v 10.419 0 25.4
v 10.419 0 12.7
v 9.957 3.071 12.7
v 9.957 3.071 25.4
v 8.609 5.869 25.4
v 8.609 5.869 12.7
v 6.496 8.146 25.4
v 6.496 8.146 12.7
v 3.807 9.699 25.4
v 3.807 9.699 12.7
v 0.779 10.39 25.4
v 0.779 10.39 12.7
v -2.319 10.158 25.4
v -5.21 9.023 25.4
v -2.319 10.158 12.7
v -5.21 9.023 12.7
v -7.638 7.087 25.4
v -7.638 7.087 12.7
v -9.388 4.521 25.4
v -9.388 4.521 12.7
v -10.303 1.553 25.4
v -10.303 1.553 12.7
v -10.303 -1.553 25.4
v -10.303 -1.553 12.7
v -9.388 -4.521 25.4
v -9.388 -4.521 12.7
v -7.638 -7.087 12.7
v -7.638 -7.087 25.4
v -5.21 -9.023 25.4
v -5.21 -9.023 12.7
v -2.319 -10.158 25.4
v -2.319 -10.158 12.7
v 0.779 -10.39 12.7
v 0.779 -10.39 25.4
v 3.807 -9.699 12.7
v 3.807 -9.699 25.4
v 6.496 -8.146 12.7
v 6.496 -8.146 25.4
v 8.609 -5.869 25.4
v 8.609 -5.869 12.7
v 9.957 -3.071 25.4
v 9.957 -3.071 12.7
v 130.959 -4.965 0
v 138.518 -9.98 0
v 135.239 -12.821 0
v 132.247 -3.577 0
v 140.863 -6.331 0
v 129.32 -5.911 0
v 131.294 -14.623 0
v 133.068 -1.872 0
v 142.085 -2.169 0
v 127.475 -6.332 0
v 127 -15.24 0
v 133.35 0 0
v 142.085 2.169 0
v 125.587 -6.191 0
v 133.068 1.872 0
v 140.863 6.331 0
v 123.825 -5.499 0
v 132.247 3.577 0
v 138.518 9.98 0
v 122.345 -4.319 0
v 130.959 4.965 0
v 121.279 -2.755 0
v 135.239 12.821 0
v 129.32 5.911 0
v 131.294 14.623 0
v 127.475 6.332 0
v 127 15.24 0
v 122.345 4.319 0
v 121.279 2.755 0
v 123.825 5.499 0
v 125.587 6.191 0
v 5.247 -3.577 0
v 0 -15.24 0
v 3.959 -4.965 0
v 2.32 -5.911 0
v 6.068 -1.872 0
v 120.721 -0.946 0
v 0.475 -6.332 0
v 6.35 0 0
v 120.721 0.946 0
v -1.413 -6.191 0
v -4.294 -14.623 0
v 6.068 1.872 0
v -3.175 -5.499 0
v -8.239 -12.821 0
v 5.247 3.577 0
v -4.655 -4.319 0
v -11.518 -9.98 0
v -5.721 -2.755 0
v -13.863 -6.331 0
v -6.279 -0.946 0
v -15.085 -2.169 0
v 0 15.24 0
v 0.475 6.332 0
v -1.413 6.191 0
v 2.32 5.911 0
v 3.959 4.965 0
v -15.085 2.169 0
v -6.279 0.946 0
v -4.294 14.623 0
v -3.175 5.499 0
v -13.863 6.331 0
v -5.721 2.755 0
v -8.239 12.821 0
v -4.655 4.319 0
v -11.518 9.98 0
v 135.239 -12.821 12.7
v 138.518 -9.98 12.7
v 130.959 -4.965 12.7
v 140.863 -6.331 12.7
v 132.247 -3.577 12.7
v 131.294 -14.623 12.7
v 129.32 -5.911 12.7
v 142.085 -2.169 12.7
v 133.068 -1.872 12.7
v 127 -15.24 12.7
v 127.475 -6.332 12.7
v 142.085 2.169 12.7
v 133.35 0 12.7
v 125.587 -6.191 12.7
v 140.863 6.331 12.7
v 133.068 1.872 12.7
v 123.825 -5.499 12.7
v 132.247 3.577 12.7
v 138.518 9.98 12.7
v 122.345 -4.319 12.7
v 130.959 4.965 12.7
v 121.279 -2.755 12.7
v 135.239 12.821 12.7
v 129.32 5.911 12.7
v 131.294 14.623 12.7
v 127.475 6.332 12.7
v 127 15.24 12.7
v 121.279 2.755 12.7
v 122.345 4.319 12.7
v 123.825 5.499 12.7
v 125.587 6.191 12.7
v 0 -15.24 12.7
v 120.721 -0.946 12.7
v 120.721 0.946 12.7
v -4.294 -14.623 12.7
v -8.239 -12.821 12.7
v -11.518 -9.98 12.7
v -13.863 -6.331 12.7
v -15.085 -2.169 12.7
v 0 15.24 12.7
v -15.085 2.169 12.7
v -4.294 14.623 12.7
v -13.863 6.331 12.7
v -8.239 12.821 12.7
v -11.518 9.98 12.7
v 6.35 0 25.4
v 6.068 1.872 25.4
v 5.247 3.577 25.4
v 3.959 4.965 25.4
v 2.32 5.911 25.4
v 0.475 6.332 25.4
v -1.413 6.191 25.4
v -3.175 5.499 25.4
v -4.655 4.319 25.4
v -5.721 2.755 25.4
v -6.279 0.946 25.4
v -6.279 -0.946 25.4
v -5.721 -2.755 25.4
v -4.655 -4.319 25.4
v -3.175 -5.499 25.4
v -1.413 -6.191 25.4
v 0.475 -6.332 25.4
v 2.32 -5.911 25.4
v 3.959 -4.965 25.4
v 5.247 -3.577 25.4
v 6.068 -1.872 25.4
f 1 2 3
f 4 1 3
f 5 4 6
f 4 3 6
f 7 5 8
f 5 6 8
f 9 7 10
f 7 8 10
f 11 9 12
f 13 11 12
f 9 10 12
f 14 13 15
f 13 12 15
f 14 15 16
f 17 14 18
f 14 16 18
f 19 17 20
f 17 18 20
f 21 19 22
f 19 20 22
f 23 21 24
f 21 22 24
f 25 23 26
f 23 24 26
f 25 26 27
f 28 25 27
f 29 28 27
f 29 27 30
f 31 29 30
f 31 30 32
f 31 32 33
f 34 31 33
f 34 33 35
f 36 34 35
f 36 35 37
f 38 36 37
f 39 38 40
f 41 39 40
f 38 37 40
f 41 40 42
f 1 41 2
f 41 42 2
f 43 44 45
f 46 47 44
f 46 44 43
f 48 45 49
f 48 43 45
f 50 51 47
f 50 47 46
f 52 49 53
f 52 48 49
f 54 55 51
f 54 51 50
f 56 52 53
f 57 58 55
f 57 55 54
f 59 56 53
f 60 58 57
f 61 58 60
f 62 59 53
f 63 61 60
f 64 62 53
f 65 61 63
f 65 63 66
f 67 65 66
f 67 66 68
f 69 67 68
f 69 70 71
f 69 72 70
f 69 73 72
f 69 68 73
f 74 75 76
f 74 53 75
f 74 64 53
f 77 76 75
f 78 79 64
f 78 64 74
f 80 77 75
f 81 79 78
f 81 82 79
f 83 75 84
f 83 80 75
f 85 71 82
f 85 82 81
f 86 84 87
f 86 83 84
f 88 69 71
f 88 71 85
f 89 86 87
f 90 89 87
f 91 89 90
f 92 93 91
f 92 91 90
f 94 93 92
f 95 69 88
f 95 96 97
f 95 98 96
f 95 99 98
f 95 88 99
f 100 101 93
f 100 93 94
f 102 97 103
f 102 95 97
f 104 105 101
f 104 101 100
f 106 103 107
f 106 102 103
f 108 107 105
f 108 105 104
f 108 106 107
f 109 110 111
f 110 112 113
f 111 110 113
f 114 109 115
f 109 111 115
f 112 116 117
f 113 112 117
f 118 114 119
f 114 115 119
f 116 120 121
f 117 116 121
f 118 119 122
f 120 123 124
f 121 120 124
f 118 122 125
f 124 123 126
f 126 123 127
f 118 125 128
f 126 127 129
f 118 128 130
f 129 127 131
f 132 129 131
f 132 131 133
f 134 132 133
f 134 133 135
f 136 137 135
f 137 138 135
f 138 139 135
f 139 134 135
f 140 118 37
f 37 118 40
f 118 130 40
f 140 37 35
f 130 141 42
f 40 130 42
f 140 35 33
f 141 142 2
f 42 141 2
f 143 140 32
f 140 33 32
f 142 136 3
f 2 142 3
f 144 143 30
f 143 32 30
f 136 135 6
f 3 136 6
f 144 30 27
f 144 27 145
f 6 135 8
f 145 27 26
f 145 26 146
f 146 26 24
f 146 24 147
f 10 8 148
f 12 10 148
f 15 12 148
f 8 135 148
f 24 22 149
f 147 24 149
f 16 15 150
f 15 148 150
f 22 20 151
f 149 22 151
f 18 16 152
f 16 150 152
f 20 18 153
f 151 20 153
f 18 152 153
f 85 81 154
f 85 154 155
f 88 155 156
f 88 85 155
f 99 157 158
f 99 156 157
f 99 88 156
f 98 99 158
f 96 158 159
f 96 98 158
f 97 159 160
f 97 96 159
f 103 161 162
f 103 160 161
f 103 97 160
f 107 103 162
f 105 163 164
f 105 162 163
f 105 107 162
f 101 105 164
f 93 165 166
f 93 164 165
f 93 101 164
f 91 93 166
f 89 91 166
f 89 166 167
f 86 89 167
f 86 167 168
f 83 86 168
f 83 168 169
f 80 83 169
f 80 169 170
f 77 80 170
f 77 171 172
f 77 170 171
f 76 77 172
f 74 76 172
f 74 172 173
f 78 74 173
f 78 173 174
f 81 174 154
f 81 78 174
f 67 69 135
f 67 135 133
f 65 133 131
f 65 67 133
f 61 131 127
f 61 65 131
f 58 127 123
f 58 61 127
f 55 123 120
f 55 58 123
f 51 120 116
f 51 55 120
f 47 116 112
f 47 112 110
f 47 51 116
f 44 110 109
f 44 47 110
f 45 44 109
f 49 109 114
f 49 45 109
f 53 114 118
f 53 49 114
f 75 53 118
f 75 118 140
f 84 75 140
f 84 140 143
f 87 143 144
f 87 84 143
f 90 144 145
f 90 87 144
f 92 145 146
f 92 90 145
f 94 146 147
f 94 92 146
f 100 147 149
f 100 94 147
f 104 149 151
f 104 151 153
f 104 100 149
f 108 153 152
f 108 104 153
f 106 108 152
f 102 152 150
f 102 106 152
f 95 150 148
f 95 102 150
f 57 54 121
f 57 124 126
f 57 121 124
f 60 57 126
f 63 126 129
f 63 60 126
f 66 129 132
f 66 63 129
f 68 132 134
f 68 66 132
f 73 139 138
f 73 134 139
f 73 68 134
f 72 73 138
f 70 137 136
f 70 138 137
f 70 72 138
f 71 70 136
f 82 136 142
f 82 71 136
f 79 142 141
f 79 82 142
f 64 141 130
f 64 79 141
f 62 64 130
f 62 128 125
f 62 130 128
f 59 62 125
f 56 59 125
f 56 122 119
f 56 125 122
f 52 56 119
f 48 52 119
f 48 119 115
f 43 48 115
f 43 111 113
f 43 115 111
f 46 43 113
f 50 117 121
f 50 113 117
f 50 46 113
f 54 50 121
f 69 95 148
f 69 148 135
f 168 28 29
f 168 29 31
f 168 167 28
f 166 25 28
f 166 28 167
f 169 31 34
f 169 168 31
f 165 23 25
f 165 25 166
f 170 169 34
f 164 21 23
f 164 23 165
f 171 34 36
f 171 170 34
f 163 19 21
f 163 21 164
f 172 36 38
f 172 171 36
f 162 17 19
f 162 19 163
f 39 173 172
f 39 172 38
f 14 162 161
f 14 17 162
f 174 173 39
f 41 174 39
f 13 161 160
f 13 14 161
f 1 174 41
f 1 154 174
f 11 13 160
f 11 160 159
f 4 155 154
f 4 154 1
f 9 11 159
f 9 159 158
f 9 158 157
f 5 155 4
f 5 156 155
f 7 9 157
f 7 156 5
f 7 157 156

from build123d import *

# Parameters (mm, degrees)
BOSS_EXTRUDE2_DEPTH     = 12.7
SKETCH4_R               = 10.419425035
BOSS_EXTRUDE3_DEPTH     = 12.7
CUT_EXTRUDE1_DEPTH      = 144.616730223
CUT_EXTRUDE1_DEPTH_BACK = 144.616730223
SKETCH3_R               = 6.35


with BuildPart() as part:
    # Sketch2 → Boss-Extrude2 (new body)
    with BuildSketch(Plane.XY):
        with BuildLine():
            Line((0, 15.24), (127, 15.24))
            ThreePointArc((127, 15.24), (142.24, 0), (127, -15.24))
            Line((127, -15.24), (0, -15.24))
            ThreePointArc((0, -15.24), (-15.24, 0), (0, 15.24))
        make_face()
    extrude(amount=BOSS_EXTRUDE2_DEPTH)

    # Sketch4 → Boss-Extrude3 (add)
    with BuildSketch(Plane.XY.offset(12.7)):
        Circle(SKETCH4_R)
    extrude(amount=BOSS_EXTRUDE3_DEPTH)

    # Sketch3 → Cut-Extrude1 (cut, two sides: drawn at the far end of the back side and taken through both)
    with BuildSketch(Plane.XY.offset(12.7).offset(-CUT_EXTRUDE1_DEPTH_BACK)):
        Circle(SKETCH3_R)
        with Locations((127, 0)):
            Circle(SKETCH3_R)
    extrude(amount=CUT_EXTRUDE1_DEPTH + CUT_EXTRUDE1_DEPTH_BACK, mode=Mode.SUBTRACT)


solid = part.part
